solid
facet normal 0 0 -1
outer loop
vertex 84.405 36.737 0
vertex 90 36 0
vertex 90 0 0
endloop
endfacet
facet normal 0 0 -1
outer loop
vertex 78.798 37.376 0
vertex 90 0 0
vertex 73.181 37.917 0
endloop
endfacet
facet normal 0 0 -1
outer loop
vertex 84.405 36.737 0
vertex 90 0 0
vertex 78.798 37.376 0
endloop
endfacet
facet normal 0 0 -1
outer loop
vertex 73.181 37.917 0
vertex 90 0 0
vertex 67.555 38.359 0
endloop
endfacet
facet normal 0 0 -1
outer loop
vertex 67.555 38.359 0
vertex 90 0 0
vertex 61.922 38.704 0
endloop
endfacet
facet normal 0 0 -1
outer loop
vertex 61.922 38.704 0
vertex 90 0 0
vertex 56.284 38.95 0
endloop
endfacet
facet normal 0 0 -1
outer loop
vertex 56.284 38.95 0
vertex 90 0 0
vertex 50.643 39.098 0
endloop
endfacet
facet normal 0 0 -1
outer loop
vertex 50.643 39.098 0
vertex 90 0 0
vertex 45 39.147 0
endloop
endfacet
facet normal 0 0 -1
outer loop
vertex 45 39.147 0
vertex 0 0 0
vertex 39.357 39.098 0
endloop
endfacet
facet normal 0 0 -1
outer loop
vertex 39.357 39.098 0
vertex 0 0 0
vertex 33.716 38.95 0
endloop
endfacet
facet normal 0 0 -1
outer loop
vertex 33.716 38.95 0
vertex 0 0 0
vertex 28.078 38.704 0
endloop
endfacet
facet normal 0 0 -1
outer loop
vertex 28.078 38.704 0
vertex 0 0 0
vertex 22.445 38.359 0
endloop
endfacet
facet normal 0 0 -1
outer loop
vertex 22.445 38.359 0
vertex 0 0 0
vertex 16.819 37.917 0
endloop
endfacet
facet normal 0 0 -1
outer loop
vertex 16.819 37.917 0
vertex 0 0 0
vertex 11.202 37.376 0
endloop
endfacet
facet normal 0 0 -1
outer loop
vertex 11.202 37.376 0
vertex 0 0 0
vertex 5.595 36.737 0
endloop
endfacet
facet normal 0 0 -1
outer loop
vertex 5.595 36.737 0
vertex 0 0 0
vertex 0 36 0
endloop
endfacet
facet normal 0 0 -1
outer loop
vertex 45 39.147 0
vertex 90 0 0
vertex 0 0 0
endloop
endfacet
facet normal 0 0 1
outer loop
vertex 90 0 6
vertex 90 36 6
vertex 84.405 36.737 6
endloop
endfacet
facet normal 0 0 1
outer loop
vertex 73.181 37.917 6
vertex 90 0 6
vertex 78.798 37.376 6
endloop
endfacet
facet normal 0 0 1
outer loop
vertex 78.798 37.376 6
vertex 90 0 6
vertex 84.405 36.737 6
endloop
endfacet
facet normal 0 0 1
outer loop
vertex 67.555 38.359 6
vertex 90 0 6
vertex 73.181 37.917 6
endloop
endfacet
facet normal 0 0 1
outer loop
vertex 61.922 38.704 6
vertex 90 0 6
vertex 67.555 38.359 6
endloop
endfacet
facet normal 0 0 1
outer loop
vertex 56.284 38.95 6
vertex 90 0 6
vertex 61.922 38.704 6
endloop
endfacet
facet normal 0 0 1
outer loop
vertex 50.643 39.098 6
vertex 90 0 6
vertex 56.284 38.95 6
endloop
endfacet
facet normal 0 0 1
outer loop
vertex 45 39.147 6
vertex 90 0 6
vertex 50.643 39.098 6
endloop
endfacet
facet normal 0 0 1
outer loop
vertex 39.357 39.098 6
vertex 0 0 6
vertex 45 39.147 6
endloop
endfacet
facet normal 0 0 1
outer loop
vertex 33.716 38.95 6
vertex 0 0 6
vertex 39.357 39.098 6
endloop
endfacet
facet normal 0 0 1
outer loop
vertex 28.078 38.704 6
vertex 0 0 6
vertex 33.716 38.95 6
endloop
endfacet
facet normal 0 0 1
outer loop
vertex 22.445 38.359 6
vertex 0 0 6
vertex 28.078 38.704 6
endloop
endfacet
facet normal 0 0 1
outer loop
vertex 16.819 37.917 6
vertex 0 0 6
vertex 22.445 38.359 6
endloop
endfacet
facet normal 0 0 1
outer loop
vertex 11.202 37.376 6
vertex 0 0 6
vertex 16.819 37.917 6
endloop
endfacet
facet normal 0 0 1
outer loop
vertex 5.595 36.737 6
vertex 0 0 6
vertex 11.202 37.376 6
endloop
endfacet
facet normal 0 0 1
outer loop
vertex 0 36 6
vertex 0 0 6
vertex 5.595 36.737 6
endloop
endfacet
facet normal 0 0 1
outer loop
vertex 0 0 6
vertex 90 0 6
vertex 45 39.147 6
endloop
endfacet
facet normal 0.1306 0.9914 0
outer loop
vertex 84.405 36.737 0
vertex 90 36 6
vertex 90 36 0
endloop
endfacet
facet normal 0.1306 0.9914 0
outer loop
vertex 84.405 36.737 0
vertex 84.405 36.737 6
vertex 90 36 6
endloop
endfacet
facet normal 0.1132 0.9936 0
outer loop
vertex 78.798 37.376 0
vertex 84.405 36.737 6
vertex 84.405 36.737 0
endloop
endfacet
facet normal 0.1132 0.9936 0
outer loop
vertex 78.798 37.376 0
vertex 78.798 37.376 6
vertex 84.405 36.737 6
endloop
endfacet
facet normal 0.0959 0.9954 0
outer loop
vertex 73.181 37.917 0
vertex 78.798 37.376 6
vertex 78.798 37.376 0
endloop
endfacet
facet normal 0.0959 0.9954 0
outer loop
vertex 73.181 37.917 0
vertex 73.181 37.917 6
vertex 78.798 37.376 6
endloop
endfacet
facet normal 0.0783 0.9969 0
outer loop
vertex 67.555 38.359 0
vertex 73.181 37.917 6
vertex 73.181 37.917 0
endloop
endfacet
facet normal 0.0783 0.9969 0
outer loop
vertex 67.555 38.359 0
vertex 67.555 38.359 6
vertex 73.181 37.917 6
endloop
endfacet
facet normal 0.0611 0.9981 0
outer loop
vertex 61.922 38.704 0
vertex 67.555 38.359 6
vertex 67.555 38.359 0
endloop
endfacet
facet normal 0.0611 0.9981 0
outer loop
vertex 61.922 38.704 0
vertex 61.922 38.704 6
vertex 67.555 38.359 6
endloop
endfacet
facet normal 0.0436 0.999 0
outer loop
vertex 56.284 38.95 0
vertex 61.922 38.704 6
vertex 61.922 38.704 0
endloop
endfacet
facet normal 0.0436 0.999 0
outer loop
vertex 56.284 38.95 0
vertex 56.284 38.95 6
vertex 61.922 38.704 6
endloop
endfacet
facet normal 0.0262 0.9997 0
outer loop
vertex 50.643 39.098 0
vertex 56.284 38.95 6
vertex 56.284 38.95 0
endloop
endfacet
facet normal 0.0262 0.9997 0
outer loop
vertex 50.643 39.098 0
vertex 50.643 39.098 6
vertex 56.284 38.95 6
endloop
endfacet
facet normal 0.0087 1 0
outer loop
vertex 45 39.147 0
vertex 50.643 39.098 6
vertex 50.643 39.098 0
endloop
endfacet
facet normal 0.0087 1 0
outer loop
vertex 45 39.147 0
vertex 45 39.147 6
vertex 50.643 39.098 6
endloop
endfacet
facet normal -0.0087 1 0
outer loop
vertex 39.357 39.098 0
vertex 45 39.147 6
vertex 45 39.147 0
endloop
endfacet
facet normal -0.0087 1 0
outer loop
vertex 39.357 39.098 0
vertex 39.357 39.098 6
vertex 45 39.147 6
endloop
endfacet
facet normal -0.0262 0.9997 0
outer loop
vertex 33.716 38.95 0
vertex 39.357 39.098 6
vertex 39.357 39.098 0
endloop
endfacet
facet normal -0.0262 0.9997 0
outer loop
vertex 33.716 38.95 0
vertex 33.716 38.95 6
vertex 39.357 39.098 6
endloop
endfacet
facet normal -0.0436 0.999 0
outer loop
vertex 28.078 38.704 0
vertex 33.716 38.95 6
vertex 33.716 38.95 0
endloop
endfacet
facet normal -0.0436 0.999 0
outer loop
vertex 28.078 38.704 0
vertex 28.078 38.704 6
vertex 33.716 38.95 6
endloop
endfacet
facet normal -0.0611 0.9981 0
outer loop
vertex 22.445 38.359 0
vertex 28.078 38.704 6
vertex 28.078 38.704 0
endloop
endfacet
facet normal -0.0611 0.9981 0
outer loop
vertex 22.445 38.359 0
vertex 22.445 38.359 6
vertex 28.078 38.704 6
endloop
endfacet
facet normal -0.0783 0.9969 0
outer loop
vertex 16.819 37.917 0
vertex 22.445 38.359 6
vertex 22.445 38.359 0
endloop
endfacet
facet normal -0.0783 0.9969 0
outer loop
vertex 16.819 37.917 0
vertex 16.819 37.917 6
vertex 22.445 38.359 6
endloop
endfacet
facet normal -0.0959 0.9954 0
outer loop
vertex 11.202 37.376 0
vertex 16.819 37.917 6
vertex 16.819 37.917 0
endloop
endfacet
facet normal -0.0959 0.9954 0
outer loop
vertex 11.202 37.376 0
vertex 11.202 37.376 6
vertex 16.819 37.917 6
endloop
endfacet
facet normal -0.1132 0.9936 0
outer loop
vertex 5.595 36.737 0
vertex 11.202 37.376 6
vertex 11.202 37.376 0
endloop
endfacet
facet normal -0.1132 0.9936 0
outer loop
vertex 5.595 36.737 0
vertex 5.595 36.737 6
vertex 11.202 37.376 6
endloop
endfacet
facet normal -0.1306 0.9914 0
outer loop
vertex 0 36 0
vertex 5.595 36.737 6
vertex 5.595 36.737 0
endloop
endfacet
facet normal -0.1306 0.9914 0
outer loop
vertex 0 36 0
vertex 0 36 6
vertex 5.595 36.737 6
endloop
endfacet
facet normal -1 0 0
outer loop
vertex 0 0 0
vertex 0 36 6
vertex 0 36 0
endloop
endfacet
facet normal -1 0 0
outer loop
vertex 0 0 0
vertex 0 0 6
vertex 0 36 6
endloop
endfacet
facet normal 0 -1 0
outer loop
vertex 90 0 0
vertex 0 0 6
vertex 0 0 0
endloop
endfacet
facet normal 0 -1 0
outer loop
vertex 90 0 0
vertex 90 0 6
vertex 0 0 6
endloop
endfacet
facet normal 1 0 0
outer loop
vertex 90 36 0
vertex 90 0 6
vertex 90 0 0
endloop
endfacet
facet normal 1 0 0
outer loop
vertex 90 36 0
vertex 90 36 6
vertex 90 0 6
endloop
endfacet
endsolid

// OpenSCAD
$fn = 32;

// ----------------------------------------------------------------------
// Arc profile plate: crown, 19 points
// ----------------------------------------------------------------------

// --- parameters (mm) ---
bar_l = 90;               // bar length, X
bar_w = 36;               // bar height at the ends, Y
arc_r = 323.34;           // radius of the crown arc
arc_angle = 16;           // crown arc angle, degrees
crown_rise = 3.15;        // rise of the crown over the ends
arc_step = 1;             // sampling step of the crown arc, degrees
plate_t = 6;              // plate thickness, Z

bbox_y = bar_w + crown_rise;  // full height with the crown

profile = [[90, 36], [84.405, 36.737], [78.798, 37.376], [73.181, 37.917], [67.555, 38.359], [61.922, 38.704], [56.284, 38.95], [50.643, 39.098], [45, 39.147], [39.357, 39.098], [33.716, 38.95], [28.078, 38.704], [22.445, 38.359], [16.819, 37.917], [11.202, 37.376], [5.595, 36.737], [0, 36], [0, 0], [90, 0]];  // primary outline, 19 points, counter clockwise

// --- the one profile operation ---
linear_extrude(height = plate_t) polygon(points = profile);
